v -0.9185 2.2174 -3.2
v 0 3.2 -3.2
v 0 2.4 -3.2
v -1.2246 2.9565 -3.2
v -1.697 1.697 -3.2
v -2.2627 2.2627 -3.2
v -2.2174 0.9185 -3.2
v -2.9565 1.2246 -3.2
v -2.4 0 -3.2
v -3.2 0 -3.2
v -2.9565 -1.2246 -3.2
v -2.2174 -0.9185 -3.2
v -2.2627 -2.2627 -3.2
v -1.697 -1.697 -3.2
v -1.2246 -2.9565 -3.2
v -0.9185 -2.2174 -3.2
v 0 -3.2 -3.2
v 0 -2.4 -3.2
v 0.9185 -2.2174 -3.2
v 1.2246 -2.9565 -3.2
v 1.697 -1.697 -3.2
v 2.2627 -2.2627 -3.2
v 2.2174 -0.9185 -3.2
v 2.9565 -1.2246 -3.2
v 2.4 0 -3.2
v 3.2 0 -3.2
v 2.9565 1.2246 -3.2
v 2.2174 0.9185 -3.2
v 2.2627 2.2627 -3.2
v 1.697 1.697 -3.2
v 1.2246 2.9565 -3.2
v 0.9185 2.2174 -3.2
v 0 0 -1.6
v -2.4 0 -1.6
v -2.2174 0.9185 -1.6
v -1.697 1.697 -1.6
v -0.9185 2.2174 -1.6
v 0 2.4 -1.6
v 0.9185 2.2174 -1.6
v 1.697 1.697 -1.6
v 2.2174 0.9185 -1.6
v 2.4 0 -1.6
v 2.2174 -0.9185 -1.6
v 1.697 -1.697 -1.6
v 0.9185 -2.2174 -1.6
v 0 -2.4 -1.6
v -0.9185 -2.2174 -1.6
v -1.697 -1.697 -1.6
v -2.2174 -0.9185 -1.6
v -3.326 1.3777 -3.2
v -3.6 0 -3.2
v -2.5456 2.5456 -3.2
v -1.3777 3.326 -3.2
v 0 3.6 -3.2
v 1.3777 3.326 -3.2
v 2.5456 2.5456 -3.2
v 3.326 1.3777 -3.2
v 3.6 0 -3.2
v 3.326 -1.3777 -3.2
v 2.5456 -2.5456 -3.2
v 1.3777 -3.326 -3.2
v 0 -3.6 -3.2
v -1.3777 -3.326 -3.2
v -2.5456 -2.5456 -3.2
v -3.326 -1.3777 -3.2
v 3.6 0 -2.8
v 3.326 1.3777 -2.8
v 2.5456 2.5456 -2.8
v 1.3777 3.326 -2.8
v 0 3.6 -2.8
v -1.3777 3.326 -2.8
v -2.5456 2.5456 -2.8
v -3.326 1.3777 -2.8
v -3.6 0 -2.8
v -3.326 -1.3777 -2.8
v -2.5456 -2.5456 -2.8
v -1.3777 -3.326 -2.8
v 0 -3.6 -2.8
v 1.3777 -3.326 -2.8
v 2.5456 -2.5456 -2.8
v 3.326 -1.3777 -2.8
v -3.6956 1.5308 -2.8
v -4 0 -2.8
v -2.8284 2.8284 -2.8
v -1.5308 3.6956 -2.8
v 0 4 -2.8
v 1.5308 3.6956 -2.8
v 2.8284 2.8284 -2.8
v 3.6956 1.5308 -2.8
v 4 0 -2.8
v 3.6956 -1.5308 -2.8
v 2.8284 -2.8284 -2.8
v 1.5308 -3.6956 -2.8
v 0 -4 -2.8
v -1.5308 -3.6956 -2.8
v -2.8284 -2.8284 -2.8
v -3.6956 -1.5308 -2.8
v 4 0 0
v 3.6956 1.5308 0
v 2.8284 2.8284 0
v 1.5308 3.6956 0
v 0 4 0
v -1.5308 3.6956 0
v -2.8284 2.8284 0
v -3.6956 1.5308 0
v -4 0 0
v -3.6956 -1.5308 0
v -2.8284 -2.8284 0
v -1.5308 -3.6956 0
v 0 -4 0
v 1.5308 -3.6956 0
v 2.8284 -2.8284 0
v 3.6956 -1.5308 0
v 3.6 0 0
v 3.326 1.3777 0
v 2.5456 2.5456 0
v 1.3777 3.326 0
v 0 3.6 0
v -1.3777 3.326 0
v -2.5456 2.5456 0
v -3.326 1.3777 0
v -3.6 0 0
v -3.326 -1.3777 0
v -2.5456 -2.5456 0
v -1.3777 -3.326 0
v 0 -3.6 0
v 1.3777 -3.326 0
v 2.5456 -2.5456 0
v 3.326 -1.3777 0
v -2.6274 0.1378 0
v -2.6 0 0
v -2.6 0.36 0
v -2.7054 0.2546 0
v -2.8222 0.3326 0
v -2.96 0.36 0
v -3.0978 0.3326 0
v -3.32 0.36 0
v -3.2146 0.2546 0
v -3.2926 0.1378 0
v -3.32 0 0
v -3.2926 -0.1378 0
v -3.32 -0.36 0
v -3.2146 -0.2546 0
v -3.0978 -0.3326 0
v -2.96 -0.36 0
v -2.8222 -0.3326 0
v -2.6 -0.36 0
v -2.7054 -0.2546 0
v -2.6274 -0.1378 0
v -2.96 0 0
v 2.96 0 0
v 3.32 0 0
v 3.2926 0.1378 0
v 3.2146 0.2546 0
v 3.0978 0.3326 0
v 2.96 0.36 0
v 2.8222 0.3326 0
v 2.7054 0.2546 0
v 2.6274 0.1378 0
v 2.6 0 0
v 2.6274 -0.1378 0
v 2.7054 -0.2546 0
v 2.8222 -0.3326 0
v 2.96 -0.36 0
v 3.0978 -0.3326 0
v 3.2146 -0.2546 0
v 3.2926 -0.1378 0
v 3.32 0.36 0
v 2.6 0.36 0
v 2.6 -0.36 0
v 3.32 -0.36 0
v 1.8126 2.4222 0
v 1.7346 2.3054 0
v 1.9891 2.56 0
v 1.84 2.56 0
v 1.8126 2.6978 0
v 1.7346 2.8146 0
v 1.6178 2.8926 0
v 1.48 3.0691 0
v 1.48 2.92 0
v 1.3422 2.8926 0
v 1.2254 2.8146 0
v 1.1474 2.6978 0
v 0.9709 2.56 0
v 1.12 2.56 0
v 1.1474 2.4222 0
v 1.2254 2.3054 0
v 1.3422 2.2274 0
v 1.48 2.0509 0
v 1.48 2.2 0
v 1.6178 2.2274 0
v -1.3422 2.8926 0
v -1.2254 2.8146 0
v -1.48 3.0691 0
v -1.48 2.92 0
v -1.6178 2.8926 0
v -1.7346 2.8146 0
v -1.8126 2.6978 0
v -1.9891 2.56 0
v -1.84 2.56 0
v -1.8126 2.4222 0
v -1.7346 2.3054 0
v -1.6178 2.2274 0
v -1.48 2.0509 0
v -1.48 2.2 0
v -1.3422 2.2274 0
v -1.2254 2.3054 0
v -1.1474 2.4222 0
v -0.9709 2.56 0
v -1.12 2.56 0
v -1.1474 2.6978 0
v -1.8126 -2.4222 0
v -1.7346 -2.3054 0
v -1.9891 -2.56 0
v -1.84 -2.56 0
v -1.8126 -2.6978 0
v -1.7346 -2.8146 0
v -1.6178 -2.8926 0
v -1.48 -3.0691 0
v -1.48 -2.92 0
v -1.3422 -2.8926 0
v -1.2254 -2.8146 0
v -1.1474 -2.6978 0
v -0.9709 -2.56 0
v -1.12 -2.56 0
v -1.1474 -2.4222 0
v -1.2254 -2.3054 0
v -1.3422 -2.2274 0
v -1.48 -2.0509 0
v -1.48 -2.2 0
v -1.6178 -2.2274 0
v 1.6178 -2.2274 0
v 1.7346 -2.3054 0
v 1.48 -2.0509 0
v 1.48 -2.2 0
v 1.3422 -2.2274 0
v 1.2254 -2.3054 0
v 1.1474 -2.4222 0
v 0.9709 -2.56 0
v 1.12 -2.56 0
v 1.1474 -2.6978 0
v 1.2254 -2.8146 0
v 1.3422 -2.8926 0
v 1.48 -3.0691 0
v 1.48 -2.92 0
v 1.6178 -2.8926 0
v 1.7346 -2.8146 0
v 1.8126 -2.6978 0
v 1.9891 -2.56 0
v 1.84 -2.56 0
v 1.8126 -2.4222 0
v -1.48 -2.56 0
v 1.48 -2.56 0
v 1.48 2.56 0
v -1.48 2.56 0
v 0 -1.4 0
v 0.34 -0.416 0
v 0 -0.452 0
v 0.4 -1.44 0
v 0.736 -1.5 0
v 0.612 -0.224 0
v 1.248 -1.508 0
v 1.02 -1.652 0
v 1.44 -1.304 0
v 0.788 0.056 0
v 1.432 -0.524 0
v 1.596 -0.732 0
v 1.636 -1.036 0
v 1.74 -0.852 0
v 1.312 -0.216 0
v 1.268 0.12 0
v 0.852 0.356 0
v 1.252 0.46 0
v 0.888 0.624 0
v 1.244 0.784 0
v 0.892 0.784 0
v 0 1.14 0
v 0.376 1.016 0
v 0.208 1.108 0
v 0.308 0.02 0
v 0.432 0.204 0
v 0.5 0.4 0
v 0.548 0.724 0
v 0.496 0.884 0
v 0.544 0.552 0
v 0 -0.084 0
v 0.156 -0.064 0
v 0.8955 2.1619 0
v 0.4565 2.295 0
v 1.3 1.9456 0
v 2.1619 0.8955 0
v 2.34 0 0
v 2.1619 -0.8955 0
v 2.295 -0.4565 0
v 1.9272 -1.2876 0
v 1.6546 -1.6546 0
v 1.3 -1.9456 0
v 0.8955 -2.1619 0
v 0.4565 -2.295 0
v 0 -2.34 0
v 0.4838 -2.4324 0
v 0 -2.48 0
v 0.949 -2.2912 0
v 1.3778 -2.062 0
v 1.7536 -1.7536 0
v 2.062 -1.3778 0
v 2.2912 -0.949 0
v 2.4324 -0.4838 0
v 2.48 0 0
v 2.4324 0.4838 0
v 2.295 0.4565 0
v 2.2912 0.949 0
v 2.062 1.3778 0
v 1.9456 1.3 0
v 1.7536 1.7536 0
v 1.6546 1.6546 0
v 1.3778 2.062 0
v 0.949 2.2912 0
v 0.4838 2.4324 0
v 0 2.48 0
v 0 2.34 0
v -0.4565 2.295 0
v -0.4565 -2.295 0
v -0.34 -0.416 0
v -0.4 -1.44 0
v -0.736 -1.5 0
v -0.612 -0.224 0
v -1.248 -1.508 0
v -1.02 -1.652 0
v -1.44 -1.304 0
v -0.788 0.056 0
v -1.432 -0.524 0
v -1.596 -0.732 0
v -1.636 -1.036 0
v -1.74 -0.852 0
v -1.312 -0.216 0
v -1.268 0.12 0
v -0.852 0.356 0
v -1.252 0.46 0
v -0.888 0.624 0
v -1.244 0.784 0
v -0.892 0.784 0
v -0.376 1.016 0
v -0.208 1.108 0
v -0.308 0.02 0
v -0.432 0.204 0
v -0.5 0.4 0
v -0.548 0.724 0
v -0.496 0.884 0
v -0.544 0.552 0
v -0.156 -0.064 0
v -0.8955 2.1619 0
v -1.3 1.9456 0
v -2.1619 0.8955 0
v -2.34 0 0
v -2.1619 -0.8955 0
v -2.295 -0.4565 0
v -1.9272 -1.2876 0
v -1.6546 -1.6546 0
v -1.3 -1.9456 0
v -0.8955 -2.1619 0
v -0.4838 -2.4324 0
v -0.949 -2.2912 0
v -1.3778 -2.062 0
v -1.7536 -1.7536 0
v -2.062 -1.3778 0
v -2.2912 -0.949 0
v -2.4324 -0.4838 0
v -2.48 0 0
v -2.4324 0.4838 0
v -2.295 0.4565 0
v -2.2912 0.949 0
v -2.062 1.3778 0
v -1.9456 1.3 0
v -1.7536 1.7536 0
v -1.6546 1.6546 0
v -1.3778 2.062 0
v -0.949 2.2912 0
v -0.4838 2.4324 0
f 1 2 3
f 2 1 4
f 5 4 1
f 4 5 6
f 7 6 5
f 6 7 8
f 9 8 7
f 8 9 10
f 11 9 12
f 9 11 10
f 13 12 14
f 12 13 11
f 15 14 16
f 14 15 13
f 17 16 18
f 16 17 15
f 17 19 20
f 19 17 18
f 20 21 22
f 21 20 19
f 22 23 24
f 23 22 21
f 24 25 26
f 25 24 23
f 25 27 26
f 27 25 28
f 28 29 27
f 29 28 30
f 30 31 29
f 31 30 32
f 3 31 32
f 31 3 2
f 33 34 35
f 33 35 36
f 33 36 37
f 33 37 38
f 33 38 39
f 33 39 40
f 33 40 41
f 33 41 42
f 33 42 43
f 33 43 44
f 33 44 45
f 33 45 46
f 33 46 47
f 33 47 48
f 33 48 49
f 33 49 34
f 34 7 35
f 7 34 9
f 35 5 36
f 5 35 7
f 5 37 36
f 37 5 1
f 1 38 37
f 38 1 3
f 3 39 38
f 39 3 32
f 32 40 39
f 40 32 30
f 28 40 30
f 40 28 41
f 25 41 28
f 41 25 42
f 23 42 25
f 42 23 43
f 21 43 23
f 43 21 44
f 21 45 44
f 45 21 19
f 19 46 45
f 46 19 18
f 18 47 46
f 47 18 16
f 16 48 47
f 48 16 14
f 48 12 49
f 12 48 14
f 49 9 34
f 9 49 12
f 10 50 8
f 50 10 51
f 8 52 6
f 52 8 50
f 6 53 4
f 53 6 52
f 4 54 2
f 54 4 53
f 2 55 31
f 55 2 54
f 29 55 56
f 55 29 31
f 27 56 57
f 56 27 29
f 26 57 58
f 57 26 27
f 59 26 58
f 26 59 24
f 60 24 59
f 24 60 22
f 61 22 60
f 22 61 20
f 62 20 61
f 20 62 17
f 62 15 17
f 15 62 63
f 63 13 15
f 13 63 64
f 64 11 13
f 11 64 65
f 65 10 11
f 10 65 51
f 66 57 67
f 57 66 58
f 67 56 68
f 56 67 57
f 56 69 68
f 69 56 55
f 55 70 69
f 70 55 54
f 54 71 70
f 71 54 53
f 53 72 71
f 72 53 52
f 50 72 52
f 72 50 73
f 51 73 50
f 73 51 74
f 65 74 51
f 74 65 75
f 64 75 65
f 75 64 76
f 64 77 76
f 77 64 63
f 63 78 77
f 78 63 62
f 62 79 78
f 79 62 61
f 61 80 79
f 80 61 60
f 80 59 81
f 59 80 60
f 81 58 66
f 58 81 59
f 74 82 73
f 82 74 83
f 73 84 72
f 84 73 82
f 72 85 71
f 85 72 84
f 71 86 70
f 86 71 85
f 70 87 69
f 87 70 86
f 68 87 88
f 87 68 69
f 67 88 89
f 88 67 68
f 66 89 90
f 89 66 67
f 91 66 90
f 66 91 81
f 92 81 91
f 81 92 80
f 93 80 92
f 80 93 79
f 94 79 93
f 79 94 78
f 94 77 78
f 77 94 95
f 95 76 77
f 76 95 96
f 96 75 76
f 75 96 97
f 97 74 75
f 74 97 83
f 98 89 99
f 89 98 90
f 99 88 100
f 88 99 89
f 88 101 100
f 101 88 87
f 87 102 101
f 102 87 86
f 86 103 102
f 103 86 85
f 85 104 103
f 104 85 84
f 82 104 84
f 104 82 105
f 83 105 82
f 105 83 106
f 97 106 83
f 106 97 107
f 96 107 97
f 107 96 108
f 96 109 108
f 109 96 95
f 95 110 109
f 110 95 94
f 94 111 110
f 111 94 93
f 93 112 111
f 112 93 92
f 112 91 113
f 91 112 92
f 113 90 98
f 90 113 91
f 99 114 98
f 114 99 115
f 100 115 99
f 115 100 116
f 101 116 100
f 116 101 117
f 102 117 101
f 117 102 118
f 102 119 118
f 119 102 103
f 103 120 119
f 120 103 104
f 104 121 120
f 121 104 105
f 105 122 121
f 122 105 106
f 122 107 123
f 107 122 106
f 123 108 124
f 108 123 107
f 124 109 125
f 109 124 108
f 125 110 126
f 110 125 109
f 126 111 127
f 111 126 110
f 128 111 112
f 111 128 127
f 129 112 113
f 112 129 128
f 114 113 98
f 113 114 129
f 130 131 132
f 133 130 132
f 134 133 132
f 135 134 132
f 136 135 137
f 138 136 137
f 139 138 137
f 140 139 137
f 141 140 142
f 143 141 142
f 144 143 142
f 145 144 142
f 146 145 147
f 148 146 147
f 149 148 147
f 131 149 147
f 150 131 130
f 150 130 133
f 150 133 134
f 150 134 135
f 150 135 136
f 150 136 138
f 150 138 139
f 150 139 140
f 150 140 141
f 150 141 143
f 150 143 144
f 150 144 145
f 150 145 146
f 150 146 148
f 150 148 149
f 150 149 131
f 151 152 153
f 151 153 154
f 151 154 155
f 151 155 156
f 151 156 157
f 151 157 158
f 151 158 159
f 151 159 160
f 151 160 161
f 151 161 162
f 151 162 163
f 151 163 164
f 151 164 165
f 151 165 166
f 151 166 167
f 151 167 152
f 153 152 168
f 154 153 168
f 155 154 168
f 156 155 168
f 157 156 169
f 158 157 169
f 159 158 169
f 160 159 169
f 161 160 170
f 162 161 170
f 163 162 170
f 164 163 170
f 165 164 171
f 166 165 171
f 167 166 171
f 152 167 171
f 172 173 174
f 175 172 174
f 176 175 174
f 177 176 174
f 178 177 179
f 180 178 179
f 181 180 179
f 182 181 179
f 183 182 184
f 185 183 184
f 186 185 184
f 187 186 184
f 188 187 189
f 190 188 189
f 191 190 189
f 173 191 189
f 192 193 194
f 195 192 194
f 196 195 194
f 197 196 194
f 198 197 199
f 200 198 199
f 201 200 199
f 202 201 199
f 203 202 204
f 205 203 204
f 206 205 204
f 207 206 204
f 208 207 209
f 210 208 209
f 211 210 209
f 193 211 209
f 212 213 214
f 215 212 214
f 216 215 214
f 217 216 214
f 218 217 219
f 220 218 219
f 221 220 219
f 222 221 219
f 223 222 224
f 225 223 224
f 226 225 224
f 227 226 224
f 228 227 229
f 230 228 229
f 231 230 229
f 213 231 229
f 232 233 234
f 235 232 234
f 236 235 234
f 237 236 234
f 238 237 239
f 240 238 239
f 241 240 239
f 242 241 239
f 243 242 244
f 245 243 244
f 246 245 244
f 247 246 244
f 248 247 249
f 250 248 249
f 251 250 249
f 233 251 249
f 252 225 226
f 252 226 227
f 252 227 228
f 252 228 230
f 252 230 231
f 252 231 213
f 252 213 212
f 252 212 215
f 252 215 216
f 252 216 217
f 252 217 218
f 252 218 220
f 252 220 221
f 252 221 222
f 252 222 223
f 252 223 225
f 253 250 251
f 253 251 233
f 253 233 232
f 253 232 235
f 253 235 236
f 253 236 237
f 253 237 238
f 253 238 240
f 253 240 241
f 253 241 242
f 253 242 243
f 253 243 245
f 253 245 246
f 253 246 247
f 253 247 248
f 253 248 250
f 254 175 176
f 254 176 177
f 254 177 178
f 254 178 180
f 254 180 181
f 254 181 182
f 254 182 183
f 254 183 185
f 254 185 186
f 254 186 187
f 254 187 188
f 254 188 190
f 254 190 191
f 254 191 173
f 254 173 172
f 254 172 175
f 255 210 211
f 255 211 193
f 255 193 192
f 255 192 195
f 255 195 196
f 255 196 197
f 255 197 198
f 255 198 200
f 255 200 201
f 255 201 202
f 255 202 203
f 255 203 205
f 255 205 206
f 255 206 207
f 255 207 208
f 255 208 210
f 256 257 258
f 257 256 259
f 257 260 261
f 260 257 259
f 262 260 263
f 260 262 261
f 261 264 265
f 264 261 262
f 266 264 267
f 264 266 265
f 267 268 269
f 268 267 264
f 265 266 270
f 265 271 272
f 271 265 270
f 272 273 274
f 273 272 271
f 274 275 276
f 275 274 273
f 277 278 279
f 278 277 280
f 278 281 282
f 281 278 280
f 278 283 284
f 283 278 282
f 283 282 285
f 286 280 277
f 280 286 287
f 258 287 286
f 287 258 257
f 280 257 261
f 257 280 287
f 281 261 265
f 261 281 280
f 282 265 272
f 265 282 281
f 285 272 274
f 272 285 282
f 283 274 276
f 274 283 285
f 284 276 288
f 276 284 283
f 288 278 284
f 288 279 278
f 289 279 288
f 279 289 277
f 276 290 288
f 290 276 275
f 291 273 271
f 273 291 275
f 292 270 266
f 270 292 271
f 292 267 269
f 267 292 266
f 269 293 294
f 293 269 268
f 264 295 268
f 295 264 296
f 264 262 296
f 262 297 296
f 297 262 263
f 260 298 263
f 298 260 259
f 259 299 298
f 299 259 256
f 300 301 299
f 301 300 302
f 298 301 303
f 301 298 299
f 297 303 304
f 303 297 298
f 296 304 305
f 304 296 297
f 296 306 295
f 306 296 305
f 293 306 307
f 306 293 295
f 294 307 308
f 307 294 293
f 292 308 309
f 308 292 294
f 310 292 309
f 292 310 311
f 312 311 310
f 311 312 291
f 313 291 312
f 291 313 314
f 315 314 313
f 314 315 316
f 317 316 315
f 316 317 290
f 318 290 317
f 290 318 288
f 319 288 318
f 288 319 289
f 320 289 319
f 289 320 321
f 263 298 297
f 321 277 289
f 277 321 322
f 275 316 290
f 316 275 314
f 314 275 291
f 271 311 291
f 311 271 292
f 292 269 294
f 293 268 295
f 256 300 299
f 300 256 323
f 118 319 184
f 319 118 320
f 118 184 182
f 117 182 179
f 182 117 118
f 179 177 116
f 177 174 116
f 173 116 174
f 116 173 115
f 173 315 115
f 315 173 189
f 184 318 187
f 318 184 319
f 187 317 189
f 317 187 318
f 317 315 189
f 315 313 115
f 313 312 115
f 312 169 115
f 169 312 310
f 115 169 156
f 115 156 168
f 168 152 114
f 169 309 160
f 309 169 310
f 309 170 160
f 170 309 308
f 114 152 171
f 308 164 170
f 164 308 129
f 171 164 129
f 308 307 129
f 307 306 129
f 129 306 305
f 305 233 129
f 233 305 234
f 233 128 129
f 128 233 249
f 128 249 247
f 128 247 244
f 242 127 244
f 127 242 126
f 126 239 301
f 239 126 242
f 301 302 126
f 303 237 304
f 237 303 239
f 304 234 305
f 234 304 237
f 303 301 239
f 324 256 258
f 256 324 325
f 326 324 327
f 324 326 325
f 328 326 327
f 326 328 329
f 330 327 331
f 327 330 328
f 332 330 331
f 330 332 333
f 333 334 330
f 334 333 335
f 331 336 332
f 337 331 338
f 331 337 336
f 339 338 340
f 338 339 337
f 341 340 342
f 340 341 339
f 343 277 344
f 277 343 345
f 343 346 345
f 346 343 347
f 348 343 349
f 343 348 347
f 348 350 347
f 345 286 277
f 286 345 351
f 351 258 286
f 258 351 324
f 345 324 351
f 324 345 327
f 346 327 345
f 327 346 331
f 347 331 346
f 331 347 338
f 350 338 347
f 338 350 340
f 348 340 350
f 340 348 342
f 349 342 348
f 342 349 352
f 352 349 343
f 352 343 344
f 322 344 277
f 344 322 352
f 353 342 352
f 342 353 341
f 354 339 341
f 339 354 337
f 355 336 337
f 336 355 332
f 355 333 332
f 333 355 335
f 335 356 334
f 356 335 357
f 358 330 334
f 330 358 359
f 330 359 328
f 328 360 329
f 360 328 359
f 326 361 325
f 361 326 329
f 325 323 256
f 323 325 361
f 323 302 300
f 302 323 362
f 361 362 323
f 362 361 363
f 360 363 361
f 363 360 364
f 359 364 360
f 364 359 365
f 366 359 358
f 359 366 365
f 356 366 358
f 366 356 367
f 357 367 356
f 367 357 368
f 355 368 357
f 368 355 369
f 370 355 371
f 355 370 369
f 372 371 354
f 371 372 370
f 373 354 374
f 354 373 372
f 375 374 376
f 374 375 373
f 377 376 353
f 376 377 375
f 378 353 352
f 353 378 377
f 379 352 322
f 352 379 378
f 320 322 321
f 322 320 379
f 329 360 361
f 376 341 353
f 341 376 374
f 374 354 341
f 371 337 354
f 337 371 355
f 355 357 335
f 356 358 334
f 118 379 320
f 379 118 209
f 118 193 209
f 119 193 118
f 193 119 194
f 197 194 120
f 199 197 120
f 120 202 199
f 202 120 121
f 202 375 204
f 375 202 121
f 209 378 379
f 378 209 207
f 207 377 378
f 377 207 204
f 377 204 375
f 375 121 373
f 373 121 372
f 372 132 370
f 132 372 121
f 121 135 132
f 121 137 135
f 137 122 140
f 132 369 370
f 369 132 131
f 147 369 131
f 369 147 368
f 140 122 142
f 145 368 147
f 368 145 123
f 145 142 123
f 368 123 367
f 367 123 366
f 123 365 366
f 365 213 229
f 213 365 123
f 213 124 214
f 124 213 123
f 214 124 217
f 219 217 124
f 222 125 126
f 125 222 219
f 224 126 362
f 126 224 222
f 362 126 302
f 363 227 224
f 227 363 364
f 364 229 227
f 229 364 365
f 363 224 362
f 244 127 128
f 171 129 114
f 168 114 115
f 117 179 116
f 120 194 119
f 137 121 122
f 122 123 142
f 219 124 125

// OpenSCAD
use <../lib.scad>
use <../p/4-4disc.scad>
use <../p/4-4ering.scad>
use <../p/4-4ndis.scad>
use <s/98138s01.scad>
$fa=1; $fs=0.2;
function ldraw_lib__98138px5(realsolid=false) = [
// 0 Tile  1 x  1 Round with Metallic Silver Fuel Tank Cap Pattern
// 0 Name: 98138px5.dat
// 0 Author: Gerald Lasser [GeraldLasser]
// 0 !LDRAW_ORG Part UPDATE 2017-01
// 0 !LICENSE Licensed under CC BY 2.0 and CC BY 4.0 : see CAreadme.txt
// 
// 0 BFC CERTIFY CCW
  [0,"BFC","CERTIFY"],
  [0,"BFC","CCW"],
// 
// 0 !KEYWORDS BrickLink 98138pb059, Caterham Seven 620R, Ideas
// 
// 0 !HISTORY 2017-12-30 [PTadmin] Official Update 2017-01
// 
// 
// 1 16 0 0 0 1 0 0 0 1 0 0 0 1 s\98138s01.dat
  [1,16,0,0,0,1,0,0,0,1,0,0,0,1, ldraw_lib__s__98138s01(realsolid)],
// 1 16 0 0 0 9 0 0 0 1 0 0 0 9 4-4ering.dat
  [1,16,0,0,0,9,0,0,0,1,0,0,0,9, ldraw_lib__4_4ering(realsolid)],
// 1 16 -7.4 0 0 0.9 0 0 0 1 0 0 0 0.9 4-4ndis.dat
  [1,16,-7.4,0,0,0.9,0,0,0,1,0,0,0,0.9, ldraw_lib__4_4ndis(realsolid)],
// 1 80 -7.4 0 0 0.9 0 0 0 1 0 0 0 0.9 4-4disc.dat
  [1,80,-7.4,0,0,0.9,0,0,0,1,0,0,0,0.9, ldraw_lib__4_4disc(realsolid)],
// 1 80 7.4 0 0 0.9 0 0 0 1 0 0 0 0.9 4-4disc.dat
  [1,80,7.4,0,0,0.9,0,0,0,1,0,0,0,0.9, ldraw_lib__4_4disc(realsolid)],
// 1 16 7.4 0 0 0.9 0 0 0 1 0 0 0 0.9 4-4ndis.dat
  [1,16,7.4,0,0,0.9,0,0,0,1,0,0,0,0.9, ldraw_lib__4_4ndis(realsolid)],
// 1 16 3.7 0 6.4 0.636396 0 0.636396 0 1 0 -0.636396 0 0.636396 4-4ndis.dat
  [1,16,3.7,0,6.4,0.636396,0,0.636396,0,1,0,-0.636396,0,0.636396, ldraw_lib__4_4ndis(realsolid)],
// 1 16 -3.7 0 6.4 0.636396 0 -0.636396 0 1 0 0.636396 0 0.636396 4-4ndis.dat
  [1,16,-3.7,0,6.4,0.636396,0,-0.636396,0,1,0,0.636396,0,0.636396, ldraw_lib__4_4ndis(realsolid)],
// 1 16 -3.7 0 -6.4 -0.636396 0 -0.636396 0 1 0 0.636396 0 -0.636396 4-4ndis.dat
  [1,16,-3.7,0,-6.4,-0.636396,0,-0.636396,0,1,0,0.636396,0,-0.636396, ldraw_lib__4_4ndis(realsolid)],
// 1 16 3.7 0 -6.4 0.636396 0 -0.636396 0 1 0 0.636396 0 0.636396 4-4ndis.dat
  [1,16,3.7,0,-6.4,0.636396,0,-0.636396,0,1,0,0.636396,0,0.636396, ldraw_lib__4_4ndis(realsolid)],
// 1 80 -3.7 0 -6.4 0.9 0 0 0 1 0 0 0 0.9 4-4disc.dat
  [1,80,-3.7,0,-6.4,0.9,0,0,0,1,0,0,0,0.9, ldraw_lib__4_4disc(realsolid)],
// 1 80 3.7 0 -6.4 0.9 0 0 0 1 0 0 0 0.9 4-4disc.dat
  [1,80,3.7,0,-6.4,0.9,0,0,0,1,0,0,0,0.9, ldraw_lib__4_4disc(realsolid)],
// 1 80 3.7 0 6.4 0.9 0 0 0 1 0 0 0 0.9 4-4disc.dat
  [1,80,3.7,0,6.4,0.9,0,0,0,1,0,0,0,0.9, ldraw_lib__4_4disc(realsolid)],
// 1 80 -3.7 0 6.4 0.9 0 0 0 1 0 0 0 0.9 4-4disc.dat
  [1,80,-3.7,0,6.4,0.9,0,0,0,1,0,0,0,0.9, ldraw_lib__4_4disc(realsolid)],
// 4 80 0 0 -1.13 0 0 -3.5 1 0 -3.6 0.85 0 -1.04
  [4,80,0,0,-1.13,0,0,-3.5,1,0,-3.6,0.85,0,-1.04],
// 4 80 0.85 0 -1.04 1 0 -3.6 1.84 0 -3.75 1.53 0 -0.56
  [4,80,0.85,0,-1.04,1,0,-3.6,1.84,0,-3.75,1.53,0,-0.56],
// 4 80 1.53 0 -0.56 1.84 0 -3.75 2.55 0 -4.13 3.12 0 -3.77
  [4,80,1.53,0,-0.56,1.84,0,-3.75,2.55,0,-4.13,3.12,0,-3.77],
// 4 80 1.97 0 0.14 1.53 0 -0.56 3.12 0 -3.77 3.6 0 -3.26
  [4,80,1.97,0,0.14,1.53,0,-0.56,3.12,0,-3.77,3.6,0,-3.26],
// 4 80 3.58 0 -1.31 1.97 0 0.14 3.6 0 -3.26 3.99 0 -1.83
  [4,80,3.58,0,-1.31,1.97,0,0.14,3.6,0,-3.26,3.99,0,-1.83],
// 4 80 3.99 0 -1.83 3.6 0 -3.26 4.09 0 -2.59 4.35 0 -2.13
  [4,80,3.99,0,-1.83,3.6,0,-3.26,4.09,0,-2.59,4.35,0,-2.13],
// 3 80 1.97 0 0.14 3.58 0 -1.31 3.28 0 -0.54
  [3,80,1.97,0,0.14,3.58,0,-1.31,3.28,0,-0.54],
// 4 80 1.97 0 0.14 3.28 0 -0.54 3.17 0 0.3 2.13 0 0.89
  [4,80,1.97,0,0.14,3.28,0,-0.54,3.17,0,0.3,2.13,0,0.89],
// 4 80 2.13 0 0.89 3.17 0 0.3 3.13 0 1.15 2.22 0 1.56
  [4,80,2.13,0,0.89,3.17,0,0.3,3.13,0,1.15,2.22,0,1.56],
// 4 80 2.22 0 1.56 3.13 0 1.15 3.11 0 1.96 2.23 0 1.96
  [4,80,2.22,0,1.56,3.13,0,1.15,3.11,0,1.96,2.23,0,1.96],
// 4 80 0.52 0 2.77 0 0 2.85 0.77 0 0.05 0.94 0 2.54
  [4,80,0.52,0,2.77,0,0,2.85,0.77,0,0.05,0.94,0,2.54],
// 4 80 0.94 0 2.54 0.77 0 0.05 1.08 0 0.51 1.25 0 1
  [4,80,0.94,0,2.54,0.77,0,0.05,1.08,0,0.51,1.25,0,1],
// 4 80 1.24 0 2.21 0.94 0 2.54 1.25 0 1 1.37 0 1.81
  [4,80,1.24,0,2.21,0.94,0,2.54,1.25,0,1,1.37,0,1.81],
// 3 80 1.37 0 1.81 1.25 0 1 1.36 0 1.38
  [3,80,1.37,0,1.81,1.25,0,1,1.36,0,1.38],
// 4 80 0.39 0 -0.16 0.77 0 0.05 0 0 2.85 0 0 -0.21
  [4,80,0.39,0,-0.16,0.77,0,0.05,0,0,2.85,0,0,-0.21],
// 4 16 0.39 0 -0.16 0 0 -0.21 0 0 -1.13 0.85 0 -1.04
  [4,16,0.39,0,-0.16,0,0,-0.21,0,0,-1.13,0.85,0,-1.04],
// 4 16 0.77 0 0.05 0.39 0 -0.16 0.85 0 -1.04 1.53 0 -0.56
  [4,16,0.77,0,0.05,0.39,0,-0.16,0.85,0,-1.04,1.53,0,-0.56],
// 4 16 1.08 0 0.51 0.77 0 0.05 1.53 0 -0.56 1.97 0 0.14
  [4,16,1.08,0,0.51,0.77,0,0.05,1.53,0,-0.56,1.97,0,0.14],
// 4 16 1.25 0 1 1.08 0 0.51 1.97 0 0.14 2.13 0 0.89
  [4,16,1.25,0,1,1.08,0,0.51,1.97,0,0.14,2.13,0,0.89],
// 4 16 1.36 0 1.38 1.25 0 1 2.13 0 0.89 2.22 0 1.56
  [4,16,1.36,0,1.38,1.25,0,1,2.13,0,0.89,2.22,0,1.56],
// 4 16 1.37 0 1.81 1.36 0 1.38 2.22 0 1.56 2.23 0 1.96
  [4,16,1.37,0,1.81,1.36,0,1.38,2.22,0,1.56,2.23,0,1.96],
// 4 16 1.24 0 2.21 1.37 0 1.81 2.23 0 1.96 2.2387 0 5.4047
  [4,16,1.24,0,2.21,1.37,0,1.81,2.23,0,1.96,2.2387,0,5.4047],
// 3 16 2.2387 0 5.4047 0.94 0 2.54 1.24 0 2.21
  [3,16,2.2387,0,5.4047,0.94,0,2.54,1.24,0,2.21],
// 3 16 2.2387 0 5.4047 0.52 0 2.77 0.94 0 2.54
  [3,16,2.2387,0,5.4047,0.52,0,2.77,0.94,0,2.54],
// 4 16 0 0 2.85 0.52 0 2.77 2.2387 0 5.4047 1.1413 0 5.7376
  [4,16,0,0,2.85,0.52,0,2.77,2.2387,0,5.4047,1.1413,0,5.7376],
// 4 16 2.2387 0 5.4047 2.23 0 1.96 3.11 0 1.96 3.2501 0 4.8641
  [4,16,2.2387,0,5.4047,2.23,0,1.96,3.11,0,1.96,3.2501,0,4.8641],
// 4 16 5.4047 0 2.2387 3.11 0 1.96 3.13 0 1.15 3.17 0 0.3
  [4,16,5.4047,0,2.2387,3.11,0,1.96,3.13,0,1.15,3.17,0,0.3],
// 4 16 5.85 0 0 3.17 0 0.3 3.28 0 -0.54 3.58 0 -1.31
  [4,16,5.85,0,0,3.17,0,0.3,3.28,0,-0.54,3.58,0,-1.31],
// 4 16 5.85 0 0 3.58 0 -1.31 3.99 0 -1.83 4.35 0 -2.13
  [4,16,5.85,0,0,3.58,0,-1.31,3.99,0,-1.83,4.35,0,-2.13],
// 4 16 4.35 0 -2.13 4.09 0 -2.59 5.4047 0 -2.2387 5.7376 0 -1.1413
  [4,16,4.35,0,-2.13,4.09,0,-2.59,5.4047,0,-2.2387,5.7376,0,-1.1413],
// 4 16 4.09 0 -2.59 3.6 0 -3.26 4.1366 0 -4.1366 4.818 0 -3.219
  [4,16,4.09,0,-2.59,3.6,0,-3.26,4.1366,0,-4.1366,4.818,0,-3.219],
// 3 16 3.6 0 -3.26 3.12 0 -3.77 4.1366 0 -4.1366
  [3,16,3.6,0,-3.26,3.12,0,-3.77,4.1366,0,-4.1366],
// 4 16 4.1366 0 -4.1366 3.12 0 -3.77 2.55 0 -4.13 3.2501 0 -4.8641
  [4,16,4.1366,0,-4.1366,3.12,0,-3.77,2.55,0,-4.13,3.2501,0,-4.8641],
// 4 16 2.2387 0 -5.4047 2.55 0 -4.13 1.84 0 -3.75 1 0 -3.6
  [4,16,2.2387,0,-5.4047,2.55,0,-4.13,1.84,0,-3.75,1,0,-3.6],
// 4 16 2.2387 0 -5.4047 1 0 -3.6 0 0 -3.5 1.1413 0 -5.7376
  [4,16,2.2387,0,-5.4047,1,0,-3.6,0,0,-3.5,1.1413,0,-5.7376],
// 4 80 1.1413 0 -5.7376 0 0 -5.85 0 0 -6.2 1.2096 0 -6.0809
  [4,80,1.1413,0,-5.7376,0,0,-5.85,0,0,-6.2,1.2096,0,-6.0809],
// 4 80 2.2387 0 -5.4047 1.1413 0 -5.7376 1.2096 0 -6.0809 2.3726 0 -5.7281
  [4,80,2.2387,0,-5.4047,1.1413,0,-5.7376,1.2096,0,-6.0809,2.3726,0,-5.7281],
// 4 80 3.2501 0 -4.8641 2.2387 0 -5.4047 2.3726 0 -5.7281 3.4445 0 -5.1551
  [4,80,3.2501,0,-4.8641,2.2387,0,-5.4047,2.3726,0,-5.7281,3.4445,0,-5.1551],
// 4 80 4.1366 0 -4.1366 3.2501 0 -4.8641 3.4445 0 -5.1551 4.3841 0 -4.3841
  [4,80,4.1366,0,-4.1366,3.2501,0,-4.8641,3.4445,0,-5.1551,4.3841,0,-4.3841],
// 4 80 4.818 0 -3.219 4.1366 0 -4.1366 4.3841 0 -4.3841 5.1551 0 -3.4445
  [4,80,4.818,0,-3.219,4.1366,0,-4.1366,4.3841,0,-4.3841,5.1551,0,-3.4445],
// 4 80 5.4047 0 -2.2387 4.818 0 -3.219 5.1551 0 -3.4445 5.7281 0 -2.3726
  [4,80,5.4047,0,-2.2387,4.818,0,-3.219,5.1551,0,-3.4445,5.7281,0,-2.3726],
// 4 80 5.7376 0 -1.1413 5.4047 0 -2.2387 5.7281 0 -2.3726 6.0809 0 -1.2096
  [4,80,5.7376,0,-1.1413,5.4047,0,-2.2387,5.7281,0,-2.3726,6.0809,0,-1.2096],
// 4 80 5.85 0 0 5.7376 0 -1.1413 6.0809 0 -1.2096 6.2 0 0
  [4,80,5.85,0,0,5.7376,0,-1.1413,6.0809,0,-1.2096,6.2,0,0],
// 4 80 5.7376 0 1.1413 5.85 0 0 6.2 0 0 6.0809 0 1.2096
  [4,80,5.7376,0,1.1413,5.85,0,0,6.2,0,0,6.0809,0,1.2096],
// 4 80 5.4047 0 2.2387 5.7376 0 1.1413 6.0809 0 1.2096 5.7281 0 2.3726
  [4,80,5.4047,0,2.2387,5.7376,0,1.1413,6.0809,0,1.2096,5.7281,0,2.3726],
// 4 80 4.8641 0 3.2501 5.4047 0 2.2387 5.7281 0 2.3726 5.1551 0 3.4445
  [4,80,4.8641,0,3.2501,5.4047,0,2.2387,5.7281,0,2.3726,5.1551,0,3.4445],
// 4 80 4.1366 0 4.1366 4.8641 0 3.2501 5.1551 0 3.4445 4.3841 0 4.3841
  [4,80,4.1366,0,4.1366,4.8641,0,3.2501,5.1551,0,3.4445,4.3841,0,4.3841],
// 4 80 3.2501 0 4.8641 4.1366 0 4.1366 4.3841 0 4.3841 3.4445 0 5.1551
  [4,80,3.2501,0,4.8641,4.1366,0,4.1366,4.3841,0,4.3841,3.4445,0,5.1551],
// 4 80 2.2387 0 5.4047 3.2501 0 4.8641 3.4445 0 5.1551 2.3726 0 5.7281
  [4,80,2.2387,0,5.4047,3.2501,0,4.8641,3.4445,0,5.1551,2.3726,0,5.7281],
// 4 80 1.1413 0 5.7376 2.2387 0 5.4047 2.3726 0 5.7281 1.2096 0 6.0809
  [4,80,1.1413,0,5.7376,2.2387,0,5.4047,2.3726,0,5.7281,1.2096,0,6.0809],
// 4 80 0 0 5.85 1.1413 0 5.7376 1.2096 0 6.0809 0 0 6.2
  [4,80,0,0,5.85,1.1413,0,5.7376,1.2096,0,6.0809,0,0,6.2],
// 3 16 2.55 0 -4.13 2.2387 0 -5.4047 3.2501 0 -4.8641
  [3,16,2.55,0,-4.13,2.2387,0,-5.4047,3.2501,0,-4.8641],
// 4 16 0 0 2.85 1.1413 0 5.7376 0 0 5.85 -1.1413 0 5.7376
  [4,16,0,0,2.85,1.1413,0,5.7376,0,0,5.85,-1.1413,0,5.7376],
// 4 16 4.1366 0 4.1366 3.2501 0 4.8641 3.11 0 1.96 4.8641 0 3.2501
  [4,16,4.1366,0,4.1366,3.2501,0,4.8641,3.11,0,1.96,4.8641,0,3.2501],
// 3 16 4.8641 0 3.2501 3.11 0 1.96 5.4047 0 2.2387
  [3,16,4.8641,0,3.2501,3.11,0,1.96,5.4047,0,2.2387],
// 4 16 5.7376 0 1.1413 5.4047 0 2.2387 3.17 0 0.3 5.85 0 0
  [4,16,5.7376,0,1.1413,5.4047,0,2.2387,3.17,0,0.3,5.85,0,0],
// 3 16 5.85 0 0 4.35 0 -2.13 5.7376 0 -1.1413
  [3,16,5.85,0,0,4.35,0,-2.13,5.7376,0,-1.1413],
// 3 16 5.4047 0 -2.2387 4.09 0 -2.59 4.818 0 -3.219
  [3,16,5.4047,0,-2.2387,4.09,0,-2.59,4.818,0,-3.219],
// 4 16 0 0 -5.85 1.1413 0 -5.7376 0 0 -3.5 -1.1413 0 -5.7376
  [4,16,0,0,-5.85,1.1413,0,-5.7376,0,0,-3.5,-1.1413,0,-5.7376],
// 4 16 0 0 9 0 0 6.2 1.2096 0 6.0809 2.4272 0 6.4
  [4,16,0,0,9,0,0,6.2,1.2096,0,6.0809,2.4272,0,6.4],
// 3 16 0 0 9 2.4272 0 6.4 3.0636 0 7.0364
  [3,16,0,0,9,2.4272,0,6.4,3.0636,0,7.0364],
// 4 16 0 0 9 3.0636 0 7.0364 3.7 0 7.6728 3.4443 0 8.3151
  [4,16,0,0,9,3.0636,0,7.0364,3.7,0,7.6728,3.4443,0,8.3151],
// 3 16 3.7 0 7.672792 4.33639 0 7.03639 6.3639 0 6.3639
  [3,16,3.7,0,7.672792,4.33639,0,7.03639,6.3639,0,6.3639],
// 3 16 4.33639 0 7.03639 4.972792 0 6.4 6.3639 0 6.3639
  [3,16,4.33639,0,7.03639,4.972792,0,6.4,6.3639,0,6.3639],
// 4 16 6.3639 0 6.3639 4.9728 0 6.4 4.3364 0 5.7636 8.3151 0 3.4443
  [4,16,6.3639,0,6.3639,4.9728,0,6.4,4.3364,0,5.7636,8.3151,0,3.4443],
// 4 16 8.3151 0 3.4443 4.3364 0 5.7636 3.7 0 5.1272 4.3841 0 4.3841
  [4,16,8.3151,0,3.4443,4.3364,0,5.7636,3.7,0,5.1272,4.3841,0,4.3841],
// 4 16 2.4272 0 6.4 1.2096 0 6.0809 2.3726 0 5.7281 3.0636 0 5.7636
  [4,16,2.4272,0,6.4,1.2096,0,6.0809,2.3726,0,5.7281,3.0636,0,5.7636],
// 4 16 3.0636 0 5.7636 2.3726 0 5.7281 3.4445 0 5.1551 3.7 0 5.1272
  [4,16,3.0636,0,5.7636,2.3726,0,5.7281,3.4445,0,5.1551,3.7,0,5.1272],
// 3 16 3.4445 0 5.1551 4.3841 0 4.3841 3.7 0 5.1272
  [3,16,3.4445,0,5.1551,4.3841,0,4.3841,3.7,0,5.1272],
// 3 16 4.3841 0 4.3841 5.1551 0 3.4445 8.3151 0 3.4443
  [3,16,4.3841,0,4.3841,5.1551,0,3.4445,8.3151,0,3.4443],
// 3 16 5.1551 0 3.4445 5.7281 0 2.3726 8.3151 0 3.4443
  [3,16,5.1551,0,3.4445,5.7281,0,2.3726,8.3151,0,3.4443],
// 4 16 8.3151 0 3.4443 5.7281 0 2.3726 6.0809 0 1.2096 6.5 0 0.9
  [4,16,8.3151,0,3.4443,5.7281,0,2.3726,6.0809,0,1.2096,6.5,0,0.9],
// 3 16 8.3151 0 3.4443 6.5 0 0.9 7.4 0 0.9
  [3,16,8.3151,0,3.4443,6.5,0,0.9,7.4,0,0.9],
// 3 16 8.3151 0 3.4443 7.4 0 0.9 8.3 0 0.9
  [3,16,8.3151,0,3.4443,7.4,0,0.9,8.3,0,0.9],
// 3 16 8.3 0 0.9 8.3 0 0 9 0 0
  [3,16,8.3,0,0.9,8.3,0,0,9,0,0],
// 4 16 6.2 0 0 6.5 0 0 6.5 0 0.9 6.0809 0 1.2096
  [4,16,6.2,0,0,6.5,0,0,6.5,0,0.9,6.0809,0,1.2096],
// 4 16 6.5 0 -0.9 6.5 0 0 6.2 0 0 6.0809 0 -1.2096
  [4,16,6.5,0,-0.9,6.5,0,0,6.2,0,0,6.0809,0,-1.2096],
// 3 16 9 0 0 8.3 0 0 8.3 0 -0.9
  [3,16,9,0,0,8.3,0,0,8.3,0,-0.9],
// 4 16 6.5 0 -0.9 6.0809 0 -1.2096 8.3151 0 -3.4443 7.4 0 -0.9
  [4,16,6.5,0,-0.9,6.0809,0,-1.2096,8.3151,0,-3.4443,7.4,0,-0.9],
// 3 16 8.3 0 -0.9 7.4 0 -0.9 8.3151 0 -3.4443
  [3,16,8.3,0,-0.9,7.4,0,-0.9,8.3151,0,-3.4443],
// 3 16 6.0809 0 -1.2096 5.7281 0 -2.3726 8.3151 0 -3.4443
  [3,16,6.0809,0,-1.2096,5.7281,0,-2.3726,8.3151,0,-3.4443],
// 3 16 5.7281 0 -2.3726 5.1551 0 -3.4445 8.3151 0 -3.4443
  [3,16,5.7281,0,-2.3726,5.1551,0,-3.4445,8.3151,0,-3.4443],
// 3 16 8.3151 0 -3.4443 5.1551 0 -3.4445 4.3841 0 -4.3841
  [3,16,8.3151,0,-3.4443,5.1551,0,-3.4445,4.3841,0,-4.3841],
// 4 16 8.3151 0 -3.4443 4.3841 0 -4.3841 3.7 0 -5.1272 4.3364 0 -5.7636
  [4,16,8.3151,0,-3.4443,4.3841,0,-4.3841,3.7,0,-5.1272,4.3364,0,-5.7636],
// 4 16 4.3364 0 -5.7636 4.9728 0 -6.4 6.3639 0 -6.3639 8.3151 0 -3.4443
  [4,16,4.3364,0,-5.7636,4.9728,0,-6.4,6.3639,0,-6.3639,8.3151,0,-3.4443],
// 3 16 6.3639 0 -6.3639 4.972792 0 -6.4 4.33639 0 -7.03639
  [3,16,6.3639,0,-6.3639,4.972792,0,-6.4,4.33639,0,-7.03639],
// 3 16 6.3639 0 -6.3639 4.33639 0 -7.03639 3.7 0 -7.6728
  [3,16,6.3639,0,-6.3639,4.33639,0,-7.03639,3.7,0,-7.6728],
// 4 16 0 0 -9 3.4443 0 -8.3151 3.7 0 -7.6728 3.0636 0 -7.0364
  [4,16,0,0,-9,3.4443,0,-8.3151,3.7,0,-7.6728,3.0636,0,-7.0364],
// 4 16 0 0 -9 3.0636 0 -7.0364 2.4272 0 -6.4 1.2096 0 -6.0809
  [4,16,0,0,-9,3.0636,0,-7.0364,2.4272,0,-6.4,1.2096,0,-6.0809],
// 3 16 1.2096 0 -6.0809 0 0 -6.2 0 0 -9
  [3,16,1.2096,0,-6.0809,0,0,-6.2,0,0,-9],
// 4 16 2.3726 0 -5.7281 2.4272 0 -6.4 3.0636 0 -5.7636 3.4445 0 -5.1551
  [4,16,2.3726,0,-5.7281,2.4272,0,-6.4,3.0636,0,-5.7636,3.4445,0,-5.1551],
// 4 16 3.4445 0 -5.1551 3.0636 0 -5.7636 3.7 0 -5.1272 4.3841 0 -4.3841
  [4,16,3.4445,0,-5.1551,3.0636,0,-5.7636,3.7,0,-5.1272,4.3841,0,-4.3841],
// 3 16 2.3726 0 -5.7281 1.2096 0 -6.0809 2.4272 0 -6.4
  [3,16,2.3726,0,-5.7281,1.2096,0,-6.0809,2.4272,0,-6.4],
// 4 80 -1 0 -3.6 0 0 -3.5 0 0 -1.13 -0.85 0 -1.04
  [4,80,-1,0,-3.6,0,0,-3.5,0,0,-1.13,-0.85,0,-1.04],
// 4 80 -1.84 0 -3.75 -1 0 -3.6 -0.85 0 -1.04 -1.53 0 -0.56
  [4,80,-1.84,0,-3.75,-1,0,-3.6,-0.85,0,-1.04,-1.53,0,-0.56],
// 4 80 -2.55 0 -4.13 -1.84 0 -3.75 -1.53 0 -0.56 -3.12 0 -3.77
  [4,80,-2.55,0,-4.13,-1.84,0,-3.75,-1.53,0,-0.56,-3.12,0,-3.77],
// 4 80 -3.12 0 -3.77 -1.53 0 -0.56 -1.97 0 0.14 -3.6 0 -3.26
  [4,80,-3.12,0,-3.77,-1.53,0,-0.56,-1.97,0,0.14,-3.6,0,-3.26],
// 4 80 -3.6 0 -3.26 -1.97 0 0.14 -3.58 0 -1.31 -3.99 0 -1.83
  [4,80,-3.6,0,-3.26,-1.97,0,0.14,-3.58,0,-1.31,-3.99,0,-1.83],
// 4 80 -4.09 0 -2.59 -3.6 0 -3.26 -3.99 0 -1.83 -4.35 0 -2.13
  [4,80,-4.09,0,-2.59,-3.6,0,-3.26,-3.99,0,-1.83,-4.35,0,-2.13],
// 3 80 -1.97 0 0.14 -3.28 0 -0.54 -3.58 0 -1.31
  [3,80,-1.97,0,0.14,-3.28,0,-0.54,-3.58,0,-1.31],
// 4 80 -3.17 0 0.3 -3.28 0 -0.54 -1.97 0 0.14 -2.13 0 0.89
  [4,80,-3.17,0,0.3,-3.28,0,-0.54,-1.97,0,0.14,-2.13,0,0.89],
// 4 80 -3.13 0 1.15 -3.17 0 0.3 -2.13 0 0.89 -2.22 0 1.56
  [4,80,-3.13,0,1.15,-3.17,0,0.3,-2.13,0,0.89,-2.22,0,1.56],
// 4 80 -3.11 0 1.96 -3.13 0 1.15 -2.22 0 1.56 -2.23 0 1.96
  [4,80,-3.11,0,1.96,-3.13,0,1.15,-2.22,0,1.56,-2.23,0,1.96],
// 4 80 -0.77 0 0.05 0 0 2.85 -0.52 0 2.77 -0.94 0 2.54
  [4,80,-0.77,0,0.05,0,0,2.85,-0.52,0,2.77,-0.94,0,2.54],
// 4 80 -1.08 0 0.51 -0.77 0 0.05 -0.94 0 2.54 -1.25 0 1
  [4,80,-1.08,0,0.51,-0.77,0,0.05,-0.94,0,2.54,-1.25,0,1],
// 4 80 -1.25 0 1 -0.94 0 2.54 -1.24 0 2.21 -1.37 0 1.81
  [4,80,-1.25,0,1,-0.94,0,2.54,-1.24,0,2.21,-1.37,0,1.81],
// 3 80 -1.37 0 1.81 -1.36 0 1.38 -1.25 0 1
  [3,80,-1.37,0,1.81,-1.36,0,1.38,-1.25,0,1],
// 4 80 0 0 2.85 -0.77 0 0.05 -0.39 0 -0.16 0 0 -0.21
  [4,80,0,0,2.85,-0.77,0,0.05,-0.39,0,-0.16,0,0,-0.21],
// 4 16 0 0 -1.13 0 0 -0.21 -0.39 0 -0.16 -0.85 0 -1.04
  [4,16,0,0,-1.13,0,0,-0.21,-0.39,0,-0.16,-0.85,0,-1.04],
// 4 16 -0.85 0 -1.04 -0.39 0 -0.16 -0.77 0 0.05 -1.53 0 -0.56
  [4,16,-0.85,0,-1.04,-0.39,0,-0.16,-0.77,0,0.05,-1.53,0,-0.56],
// 4 16 -1.53 0 -0.56 -0.77 0 0.05 -1.08 0 0.51 -1.97 0 0.14
  [4,16,-1.53,0,-0.56,-0.77,0,0.05,-1.08,0,0.51,-1.97,0,0.14],
// 4 16 -1.97 0 0.14 -1.08 0 0.51 -1.25 0 1 -2.13 0 0.89
  [4,16,-1.97,0,0.14,-1.08,0,0.51,-1.25,0,1,-2.13,0,0.89],
// 4 16 -2.13 0 0.89 -1.25 0 1 -1.36 0 1.38 -2.22 0 1.56
  [4,16,-2.13,0,0.89,-1.25,0,1,-1.36,0,1.38,-2.22,0,1.56],
// 4 16 -2.22 0 1.56 -1.36 0 1.38 -1.37 0 1.81 -2.23 0 1.96
  [4,16,-2.22,0,1.56,-1.36,0,1.38,-1.37,0,1.81,-2.23,0,1.96],
// 4 16 -2.23 0 1.96 -1.37 0 1.81 -1.24 0 2.21 -2.2387 0 5.4047
  [4,16,-2.23,0,1.96,-1.37,0,1.81,-1.24,0,2.21,-2.2387,0,5.4047],
// 3 16 -2.2387 0 5.4047 -1.24 0 2.21 -0.94 0 2.54
  [3,16,-2.2387,0,5.4047,-1.24,0,2.21,-0.94,0,2.54],
// 3 16 -2.2387 0 5.4047 -0.94 0 2.54 -0.52 0 2.77
  [3,16,-2.2387,0,5.4047,-0.94,0,2.54,-0.52,0,2.77],
// 4 16 -2.2387 0 5.4047 -0.52 0 2.77 0 0 2.85 -1.1413 0 5.7376
  [4,16,-2.2387,0,5.4047,-0.52,0,2.77,0,0,2.85,-1.1413,0,5.7376],
// 4 16 -3.11 0 1.96 -2.23 0 1.96 -2.2387 0 5.4047 -3.2501 0 4.8641
  [4,16,-3.11,0,1.96,-2.23,0,1.96,-2.2387,0,5.4047,-3.2501,0,4.8641],
// 4 16 -3.13 0 1.15 -3.11 0 1.96 -5.4047 0 2.2387 -3.17 0 0.3
  [4,16,-3.13,0,1.15,-3.11,0,1.96,-5.4047,0,2.2387,-3.17,0,0.3],
// 4 16 -3.28 0 -0.54 -3.17 0 0.3 -5.85 0 0 -3.58 0 -1.31
  [4,16,-3.28,0,-0.54,-3.17,0,0.3,-5.85,0,0,-3.58,0,-1.31],
// 4 16 -3.99 0 -1.83 -3.58 0 -1.31 -5.85 0 0 -4.35 0 -2.13
  [4,16,-3.99,0,-1.83,-3.58,0,-1.31,-5.85,0,0,-4.35,0,-2.13],
// 4 16 -5.4047 0 -2.2387 -4.09 0 -2.59 -4.35 0 -2.13 -5.7376 0 -1.1413
  [4,16,-5.4047,0,-2.2387,-4.09,0,-2.59,-4.35,0,-2.13,-5.7376,0,-1.1413],
// 4 16 -4.1366 0 -4.1366 -3.6 0 -3.26 -4.09 0 -2.59 -4.818 0 -3.219
  [4,16,-4.1366,0,-4.1366,-3.6,0,-3.26,-4.09,0,-2.59,-4.818,0,-3.219],
// 3 16 -3.6 0 -3.26 -4.1366 0 -4.1366 -3.12 0 -3.77
  [3,16,-3.6,0,-3.26,-4.1366,0,-4.1366,-3.12,0,-3.77],
// 4 16 -2.55 0 -4.13 -3.12 0 -3.77 -4.1366 0 -4.1366 -3.2501 0 -4.8641
  [4,16,-2.55,0,-4.13,-3.12,0,-3.77,-4.1366,0,-4.1366,-3.2501,0,-4.8641],
// 4 16 -1.84 0 -3.75 -2.55 0 -4.13 -2.2387 0 -5.4047 -1 0 -3.6
  [4,16,-1.84,0,-3.75,-2.55,0,-4.13,-2.2387,0,-5.4047,-1,0,-3.6],
// 4 16 0 0 -3.5 -1 0 -3.6 -2.2387 0 -5.4047 -1.1413 0 -5.7376
  [4,16,0,0,-3.5,-1,0,-3.6,-2.2387,0,-5.4047,-1.1413,0,-5.7376],
// 4 80 0 0 -6.2 0 0 -5.85 -1.1413 0 -5.7376 -1.2096 0 -6.0809
  [4,80,0,0,-6.2,0,0,-5.85,-1.1413,0,-5.7376,-1.2096,0,-6.0809],
// 4 80 -1.2096 0 -6.0809 -1.1413 0 -5.7376 -2.2387 0 -5.4047 -2.3726 0 -5.7281
  [4,80,-1.2096,0,-6.0809,-1.1413,0,-5.7376,-2.2387,0,-5.4047,-2.3726,0,-5.7281],
// 4 80 -2.3726 0 -5.7281 -2.2387 0 -5.4047 -3.2501 0 -4.8641 -3.4445 0 -5.1551
  [4,80,-2.3726,0,-5.7281,-2.2387,0,-5.4047,-3.2501,0,-4.8641,-3.4445,0,-5.1551],
// 4 80 -3.4445 0 -5.1551 -3.2501 0 -4.8641 -4.1366 0 -4.1366 -4.3841 0 -4.3841
  [4,80,-3.4445,0,-5.1551,-3.2501,0,-4.8641,-4.1366,0,-4.1366,-4.3841,0,-4.3841],
// 4 80 -4.3841 0 -4.3841 -4.1366 0 -4.1366 -4.818 0 -3.219 -5.1551 0 -3.4445
  [4,80,-4.3841,0,-4.3841,-4.1366,0,-4.1366,-4.818,0,-3.219,-5.1551,0,-3.4445],
// 4 80 -5.1551 0 -3.4445 -4.818 0 -3.219 -5.4047 0 -2.2387 -5.7281 0 -2.3726
  [4,80,-5.1551,0,-3.4445,-4.818,0,-3.219,-5.4047,0,-2.2387,-5.7281,0,-2.3726],
// 4 80 -5.7281 0 -2.3726 -5.4047 0 -2.2387 -5.7376 0 -1.1413 -6.0809 0 -1.2096
  [4,80,-5.7281,0,-2.3726,-5.4047,0,-2.2387,-5.7376,0,-1.1413,-6.0809,0,-1.2096],
// 4 80 -6.0809 0 -1.2096 -5.7376 0 -1.1413 -5.85 0 0 -6.2 0 0
  [4,80,-6.0809,0,-1.2096,-5.7376,0,-1.1413,-5.85,0,0,-6.2,0,0],
// 4 80 -6.2 0 0 -5.85 0 0 -5.7376 0 1.1413 -6.0809 0 1.2096
  [4,80,-6.2,0,0,-5.85,0,0,-5.7376,0,1.1413,-6.0809,0,1.2096],
// 4 80 -6.0809 0 1.2096 -5.7376 0 1.1413 -5.4047 0 2.2387 -5.7281 0 2.3726
  [4,80,-6.0809,0,1.2096,-5.7376,0,1.1413,-5.4047,0,2.2387,-5.7281,0,2.3726],
// 4 80 -5.7281 0 2.3726 -5.4047 0 2.2387 -4.8641 0 3.2501 -5.1551 0 3.4445
  [4,80,-5.7281,0,2.3726,-5.4047,0,2.2387,-4.8641,0,3.2501,-5.1551,0,3.4445],
// 4 80 -5.1551 0 3.4445 -4.8641 0 3.2501 -4.1366 0 4.1366 -4.3841 0 4.3841
  [4,80,-5.1551,0,3.4445,-4.8641,0,3.2501,-4.1366,0,4.1366,-4.3841,0,4.3841],
// 4 80 -4.3841 0 4.3841 -4.1366 0 4.1366 -3.2501 0 4.8641 -3.4445 0 5.1551
  [4,80,-4.3841,0,4.3841,-4.1366,0,4.1366,-3.2501,0,4.8641,-3.4445,0,5.1551],
// 4 80 -3.4445 0 5.1551 -3.2501 0 4.8641 -2.2387 0 5.4047 -2.3726 0 5.7281
  [4,80,-3.4445,0,5.1551,-3.2501,0,4.8641,-2.2387,0,5.4047,-2.3726,0,5.7281],
// 4 80 -2.3726 0 5.7281 -2.2387 0 5.4047 -1.1413 0 5.7376 -1.2096 0 6.0809
  [4,80,-2.3726,0,5.7281,-2.2387,0,5.4047,-1.1413,0,5.7376,-1.2096,0,6.0809],
// 4 80 -1.2096 0 6.0809 -1.1413 0 5.7376 0 0 5.85 0 0 6.2
  [4,80,-1.2096,0,6.0809,-1.1413,0,5.7376,0,0,5.85,0,0,6.2],
// 3 16 -2.55 0 -4.13 -3.2501 0 -4.8641 -2.2387 0 -5.4047
  [3,16,-2.55,0,-4.13,-3.2501,0,-4.8641,-2.2387,0,-5.4047],
// 4 16 -3.11 0 1.96 -3.2501 0 4.8641 -4.1366 0 4.1366 -4.8641 0 3.2501
  [4,16,-3.11,0,1.96,-3.2501,0,4.8641,-4.1366,0,4.1366,-4.8641,0,3.2501],
// 3 16 -4.8641 0 3.2501 -5.4047 0 2.2387 -3.11 0 1.96
  [3,16,-4.8641,0,3.2501,-5.4047,0,2.2387,-3.11,0,1.96],
// 4 16 -3.17 0 0.3 -5.4047 0 2.2387 -5.7376 0 1.1413 -5.85 0 0
  [4,16,-3.17,0,0.3,-5.4047,0,2.2387,-5.7376,0,1.1413,-5.85,0,0],
// 3 16 -5.85 0 0 -5.7376 0 -1.1413 -4.35 0 -2.13
  [3,16,-5.85,0,0,-5.7376,0,-1.1413,-4.35,0,-2.13],
// 3 16 -5.4047 0 -2.2387 -4.818 0 -3.219 -4.09 0 -2.59
  [3,16,-5.4047,0,-2.2387,-4.818,0,-3.219,-4.09,0,-2.59],
// 4 16 -1.2096 0 6.0809 0 0 6.2 0 0 9 -2.4272 0 6.4
  [4,16,-1.2096,0,6.0809,0,0,6.2,0,0,9,-2.4272,0,6.4],
// 3 16 0 0 9 -3.0636 0 7.0364 -2.4272 0 6.4
  [3,16,0,0,9,-3.0636,0,7.0364,-2.4272,0,6.4],
// 4 16 -3.7 0 7.6728 -3.0636 0 7.0364 0 0 9 -3.4443 0 8.3151
  [4,16,-3.7,0,7.6728,-3.0636,0,7.0364,0,0,9,-3.4443,0,8.3151],
// 3 16 -4.336396 0 7.036396 -3.7 0 7.672792 -6.3639 0 6.3639
  [3,16,-4.336396,0,7.036396,-3.7,0,7.672792,-6.3639,0,6.3639],
// 3 16 -4.9728 0 6.4 -4.336396 0 7.036396 -6.3639 0 6.3639
  [3,16,-4.9728,0,6.4,-4.336396,0,7.036396,-6.3639,0,6.3639],
// 4 16 -4.3364 0 5.7636 -4.9728 0 6.4 -6.3639 0 6.3639 -8.3151 0 3.4443
  [4,16,-4.3364,0,5.7636,-4.9728,0,6.4,-6.3639,0,6.3639,-8.3151,0,3.4443],
// 4 16 -3.7 0 5.1272 -4.3364 0 5.7636 -8.3151 0 3.4443 -4.3841 0 4.3841
  [4,16,-3.7,0,5.1272,-4.3364,0,5.7636,-8.3151,0,3.4443,-4.3841,0,4.3841],
// 4 16 -2.3726 0 5.7281 -1.2096 0 6.0809 -2.4272 0 6.4 -3.0636 0 5.7636
  [4,16,-2.3726,0,5.7281,-1.2096,0,6.0809,-2.4272,0,6.4,-3.0636,0,5.7636],
// 4 16 -3.4445 0 5.1551 -2.3726 0 5.7281 -3.0636 0 5.7636 -3.7 0 5.1272
  [4,16,-3.4445,0,5.1551,-2.3726,0,5.7281,-3.0636,0,5.7636,-3.7,0,5.1272],
// 3 16 -3.4445 0 5.1551 -3.7 0 5.1272 -4.3841 0 4.3841
  [3,16,-3.4445,0,5.1551,-3.7,0,5.1272,-4.3841,0,4.3841],
// 3 16 -4.3841 0 4.3841 -8.3151 0 3.4443 -5.1551 0 3.4445
  [3,16,-4.3841,0,4.3841,-8.3151,0,3.4443,-5.1551,0,3.4445],
// 3 16 -5.1551 0 3.4445 -8.3151 0 3.4443 -5.7281 0 2.3726
  [3,16,-5.1551,0,3.4445,-8.3151,0,3.4443,-5.7281,0,2.3726],
// 4 16 -6.0809 0 1.2096 -5.7281 0 2.3726 -8.3151 0 3.4443 -6.5 0 0.9
  [4,16,-6.0809,0,1.2096,-5.7281,0,2.3726,-8.3151,0,3.4443,-6.5,0,0.9],
// 3 16 -8.3151 0 3.4443 -7.4 0 0.9 -6.5 0 0.9
  [3,16,-8.3151,0,3.4443,-7.4,0,0.9,-6.5,0,0.9],
// 3 16 -8.3151 0 3.4443 -8.3 0 0.9 -7.4 0 0.9
  [3,16,-8.3151,0,3.4443,-8.3,0,0.9,-7.4,0,0.9],
// 3 16 -8.3 0 0.9 -9 0 0 -8.3 0 0
  [3,16,-8.3,0,0.9,-9,0,0,-8.3,0,0],
// 4 16 -6.5 0 0.9 -6.5 0 0 -6.2 0 0 -6.0809 0 1.2096
  [4,16,-6.5,0,0.9,-6.5,0,0,-6.2,0,0,-6.0809,0,1.2096],
// 4 16 -6.2 0 0 -6.5 0 0 -6.5 0 -0.9 -6.0809 0 -1.2096
  [4,16,-6.2,0,0,-6.5,0,0,-6.5,0,-0.9,-6.0809,0,-1.2096],
// 3 16 -8.3 0 0 -9 0 0 -8.3 0 -0.9
  [3,16,-8.3,0,0,-9,0,0,-8.3,0,-0.9],
// 4 16 -8.3151 0 -3.4443 -6.0809 0 -1.2096 -6.5 0 -0.9 -7.4 0 -0.9
  [4,16,-8.3151,0,-3.4443,-6.0809,0,-1.2096,-6.5,0,-0.9,-7.4,0,-0.9],
// 3 16 -7.4 0 -0.9 -8.3 0 -0.9 -8.3151 0 -3.4443
  [3,16,-7.4,0,-0.9,-8.3,0,-0.9,-8.3151,0,-3.4443],
// 3 16 -6.0809 0 -1.2096 -8.3151 0 -3.4443 -5.7281 0 -2.3726
  [3,16,-6.0809,0,-1.2096,-8.3151,0,-3.4443,-5.7281,0,-2.3726],
// 3 16 -5.7281 0 -2.3726 -8.3151 0 -3.4443 -5.1551 0 -3.4445
  [3,16,-5.7281,0,-2.3726,-8.3151,0,-3.4443,-5.1551,0,-3.4445],
// 3 16 -8.3151 0 -3.4443 -4.3841 0 -4.3841 -5.1551 0 -3.4445
  [3,16,-8.3151,0,-3.4443,-4.3841,0,-4.3841,-5.1551,0,-3.4445],
// 4 16 -3.7 0 -5.1272 -4.3841 0 -4.3841 -8.3151 0 -3.4443 -4.3364 0 -5.7636
  [4,16,-3.7,0,-5.1272,-4.3841,0,-4.3841,-8.3151,0,-3.4443,-4.3364,0,-5.7636],
// 4 16 -6.3639 0 -6.3639 -4.9728 0 -6.4 -4.3364 0 -5.7636 -8.3151 0 -3.4443
  [4,16,-6.3639,0,-6.3639,-4.9728,0,-6.4,-4.3364,0,-5.7636,-8.3151,0,-3.4443],
// 3 16 -4.9728 0 -6.4 -6.3639 0 -6.3639 -4.336396 0 -7.036396
  [3,16,-4.9728,0,-6.4,-6.3639,0,-6.3639,-4.336396,0,-7.036396],
// 3 16 -3.7 0 -7.6728 -4.336396 0 -7.036396 -6.3639 0 -6.3639
  [3,16,-3.7,0,-7.6728,-4.336396,0,-7.036396,-6.3639,0,-6.3639],
// 4 16 -3.7 0 -7.6728 -3.4443 0 -8.3151 0 0 -9 -3.0636 0 -7.0364
  [4,16,-3.7,0,-7.6728,-3.4443,0,-8.3151,0,0,-9,-3.0636,0,-7.0364],
// 4 16 -2.4272 0 -6.4 -3.0636 0 -7.0364 0 0 -9 -1.2096 0 -6.0809
  [4,16,-2.4272,0,-6.4,-3.0636,0,-7.0364,0,0,-9,-1.2096,0,-6.0809],
// 3 16 -1.2096 0 -6.0809 0 0 -9 0 0 -6.2
  [3,16,-1.2096,0,-6.0809,0,0,-9,0,0,-6.2],
// 4 16 -3.0636 0 -5.7636 -2.4272 0 -6.4 -2.3726 0 -5.7281 -3.4445 0 -5.1551
  [4,16,-3.0636,0,-5.7636,-2.4272,0,-6.4,-2.3726,0,-5.7281,-3.4445,0,-5.1551],
// 4 16 -3.7 0 -5.1272 -3.0636 0 -5.7636 -3.4445 0 -5.1551 -4.3841 0 -4.3841
  [4,16,-3.7,0,-5.1272,-3.0636,0,-5.7636,-3.4445,0,-5.1551,-4.3841,0,-4.3841],
// 3 16 -2.3726 0 -5.7281 -2.4272 0 -6.4 -1.2096 0 -6.0809
  [3,16,-2.3726,0,-5.7281,-2.4272,0,-6.4,-1.2096,0,-6.0809],
// 3 16 3.7 0 -7.6728 3.4443 0 -8.3151 6.3639 0 -6.3639
  [3,16,3.7,0,-7.6728,3.4443,0,-8.3151,6.3639,0,-6.3639],
// 3 16 8.3 0 -.9 8.3151 0 -3.4443 9 0 0
  [3,16,8.3,0,-.9,8.3151,0,-3.4443,9,0,0],
// 3 16 8.3 0 .9 9 0 0 8.3151 0 3.4443
  [3,16,8.3,0,.9,9,0,0,8.3151,0,3.4443],
// 3 16 3.4443 0 8.3151 3.7 0 7.672792 6.3639 0 6.3639
  [3,16,3.4443,0,8.3151,3.7,0,7.672792,6.3639,0,6.3639],
// 3 16 -6.3639 0 6.3639 -3.7 0 7.672792 -3.4443 0 8.3151
  [3,16,-6.3639,0,6.3639,-3.7,0,7.672792,-3.4443,0,8.3151],
// 3 16 -8.3 0 .9 -8.3151 0 3.4443 -9 0 0
  [3,16,-8.3,0,.9,-8.3151,0,3.4443,-9,0,0],
// 3 16 -9 0 0 -8.3151 0 -3.4443 -8.3 0 -.9
  [3,16,-9,0,0,-8.3151,0,-3.4443,-8.3,0,-.9],
// 3 16 -3.7 0 -7.6728 -6.3639 0 -6.3639 -3.4443 0 -8.3151
  [3,16,-3.7,0,-7.6728,-6.3639,0,-6.3639,-3.4443,0,-8.3151],
];
module ldraw_lib__98138px5(step=0, col=false, unit=2/5, alt=false, line=0.2, solid=!$preview)
    makepoly(ldraw_lib__98138px5(solid), step=step, col=col, unit=unit, alt=alt, line=line, solid=solid);
ldraw_lib__98138px5(line=0.2);
